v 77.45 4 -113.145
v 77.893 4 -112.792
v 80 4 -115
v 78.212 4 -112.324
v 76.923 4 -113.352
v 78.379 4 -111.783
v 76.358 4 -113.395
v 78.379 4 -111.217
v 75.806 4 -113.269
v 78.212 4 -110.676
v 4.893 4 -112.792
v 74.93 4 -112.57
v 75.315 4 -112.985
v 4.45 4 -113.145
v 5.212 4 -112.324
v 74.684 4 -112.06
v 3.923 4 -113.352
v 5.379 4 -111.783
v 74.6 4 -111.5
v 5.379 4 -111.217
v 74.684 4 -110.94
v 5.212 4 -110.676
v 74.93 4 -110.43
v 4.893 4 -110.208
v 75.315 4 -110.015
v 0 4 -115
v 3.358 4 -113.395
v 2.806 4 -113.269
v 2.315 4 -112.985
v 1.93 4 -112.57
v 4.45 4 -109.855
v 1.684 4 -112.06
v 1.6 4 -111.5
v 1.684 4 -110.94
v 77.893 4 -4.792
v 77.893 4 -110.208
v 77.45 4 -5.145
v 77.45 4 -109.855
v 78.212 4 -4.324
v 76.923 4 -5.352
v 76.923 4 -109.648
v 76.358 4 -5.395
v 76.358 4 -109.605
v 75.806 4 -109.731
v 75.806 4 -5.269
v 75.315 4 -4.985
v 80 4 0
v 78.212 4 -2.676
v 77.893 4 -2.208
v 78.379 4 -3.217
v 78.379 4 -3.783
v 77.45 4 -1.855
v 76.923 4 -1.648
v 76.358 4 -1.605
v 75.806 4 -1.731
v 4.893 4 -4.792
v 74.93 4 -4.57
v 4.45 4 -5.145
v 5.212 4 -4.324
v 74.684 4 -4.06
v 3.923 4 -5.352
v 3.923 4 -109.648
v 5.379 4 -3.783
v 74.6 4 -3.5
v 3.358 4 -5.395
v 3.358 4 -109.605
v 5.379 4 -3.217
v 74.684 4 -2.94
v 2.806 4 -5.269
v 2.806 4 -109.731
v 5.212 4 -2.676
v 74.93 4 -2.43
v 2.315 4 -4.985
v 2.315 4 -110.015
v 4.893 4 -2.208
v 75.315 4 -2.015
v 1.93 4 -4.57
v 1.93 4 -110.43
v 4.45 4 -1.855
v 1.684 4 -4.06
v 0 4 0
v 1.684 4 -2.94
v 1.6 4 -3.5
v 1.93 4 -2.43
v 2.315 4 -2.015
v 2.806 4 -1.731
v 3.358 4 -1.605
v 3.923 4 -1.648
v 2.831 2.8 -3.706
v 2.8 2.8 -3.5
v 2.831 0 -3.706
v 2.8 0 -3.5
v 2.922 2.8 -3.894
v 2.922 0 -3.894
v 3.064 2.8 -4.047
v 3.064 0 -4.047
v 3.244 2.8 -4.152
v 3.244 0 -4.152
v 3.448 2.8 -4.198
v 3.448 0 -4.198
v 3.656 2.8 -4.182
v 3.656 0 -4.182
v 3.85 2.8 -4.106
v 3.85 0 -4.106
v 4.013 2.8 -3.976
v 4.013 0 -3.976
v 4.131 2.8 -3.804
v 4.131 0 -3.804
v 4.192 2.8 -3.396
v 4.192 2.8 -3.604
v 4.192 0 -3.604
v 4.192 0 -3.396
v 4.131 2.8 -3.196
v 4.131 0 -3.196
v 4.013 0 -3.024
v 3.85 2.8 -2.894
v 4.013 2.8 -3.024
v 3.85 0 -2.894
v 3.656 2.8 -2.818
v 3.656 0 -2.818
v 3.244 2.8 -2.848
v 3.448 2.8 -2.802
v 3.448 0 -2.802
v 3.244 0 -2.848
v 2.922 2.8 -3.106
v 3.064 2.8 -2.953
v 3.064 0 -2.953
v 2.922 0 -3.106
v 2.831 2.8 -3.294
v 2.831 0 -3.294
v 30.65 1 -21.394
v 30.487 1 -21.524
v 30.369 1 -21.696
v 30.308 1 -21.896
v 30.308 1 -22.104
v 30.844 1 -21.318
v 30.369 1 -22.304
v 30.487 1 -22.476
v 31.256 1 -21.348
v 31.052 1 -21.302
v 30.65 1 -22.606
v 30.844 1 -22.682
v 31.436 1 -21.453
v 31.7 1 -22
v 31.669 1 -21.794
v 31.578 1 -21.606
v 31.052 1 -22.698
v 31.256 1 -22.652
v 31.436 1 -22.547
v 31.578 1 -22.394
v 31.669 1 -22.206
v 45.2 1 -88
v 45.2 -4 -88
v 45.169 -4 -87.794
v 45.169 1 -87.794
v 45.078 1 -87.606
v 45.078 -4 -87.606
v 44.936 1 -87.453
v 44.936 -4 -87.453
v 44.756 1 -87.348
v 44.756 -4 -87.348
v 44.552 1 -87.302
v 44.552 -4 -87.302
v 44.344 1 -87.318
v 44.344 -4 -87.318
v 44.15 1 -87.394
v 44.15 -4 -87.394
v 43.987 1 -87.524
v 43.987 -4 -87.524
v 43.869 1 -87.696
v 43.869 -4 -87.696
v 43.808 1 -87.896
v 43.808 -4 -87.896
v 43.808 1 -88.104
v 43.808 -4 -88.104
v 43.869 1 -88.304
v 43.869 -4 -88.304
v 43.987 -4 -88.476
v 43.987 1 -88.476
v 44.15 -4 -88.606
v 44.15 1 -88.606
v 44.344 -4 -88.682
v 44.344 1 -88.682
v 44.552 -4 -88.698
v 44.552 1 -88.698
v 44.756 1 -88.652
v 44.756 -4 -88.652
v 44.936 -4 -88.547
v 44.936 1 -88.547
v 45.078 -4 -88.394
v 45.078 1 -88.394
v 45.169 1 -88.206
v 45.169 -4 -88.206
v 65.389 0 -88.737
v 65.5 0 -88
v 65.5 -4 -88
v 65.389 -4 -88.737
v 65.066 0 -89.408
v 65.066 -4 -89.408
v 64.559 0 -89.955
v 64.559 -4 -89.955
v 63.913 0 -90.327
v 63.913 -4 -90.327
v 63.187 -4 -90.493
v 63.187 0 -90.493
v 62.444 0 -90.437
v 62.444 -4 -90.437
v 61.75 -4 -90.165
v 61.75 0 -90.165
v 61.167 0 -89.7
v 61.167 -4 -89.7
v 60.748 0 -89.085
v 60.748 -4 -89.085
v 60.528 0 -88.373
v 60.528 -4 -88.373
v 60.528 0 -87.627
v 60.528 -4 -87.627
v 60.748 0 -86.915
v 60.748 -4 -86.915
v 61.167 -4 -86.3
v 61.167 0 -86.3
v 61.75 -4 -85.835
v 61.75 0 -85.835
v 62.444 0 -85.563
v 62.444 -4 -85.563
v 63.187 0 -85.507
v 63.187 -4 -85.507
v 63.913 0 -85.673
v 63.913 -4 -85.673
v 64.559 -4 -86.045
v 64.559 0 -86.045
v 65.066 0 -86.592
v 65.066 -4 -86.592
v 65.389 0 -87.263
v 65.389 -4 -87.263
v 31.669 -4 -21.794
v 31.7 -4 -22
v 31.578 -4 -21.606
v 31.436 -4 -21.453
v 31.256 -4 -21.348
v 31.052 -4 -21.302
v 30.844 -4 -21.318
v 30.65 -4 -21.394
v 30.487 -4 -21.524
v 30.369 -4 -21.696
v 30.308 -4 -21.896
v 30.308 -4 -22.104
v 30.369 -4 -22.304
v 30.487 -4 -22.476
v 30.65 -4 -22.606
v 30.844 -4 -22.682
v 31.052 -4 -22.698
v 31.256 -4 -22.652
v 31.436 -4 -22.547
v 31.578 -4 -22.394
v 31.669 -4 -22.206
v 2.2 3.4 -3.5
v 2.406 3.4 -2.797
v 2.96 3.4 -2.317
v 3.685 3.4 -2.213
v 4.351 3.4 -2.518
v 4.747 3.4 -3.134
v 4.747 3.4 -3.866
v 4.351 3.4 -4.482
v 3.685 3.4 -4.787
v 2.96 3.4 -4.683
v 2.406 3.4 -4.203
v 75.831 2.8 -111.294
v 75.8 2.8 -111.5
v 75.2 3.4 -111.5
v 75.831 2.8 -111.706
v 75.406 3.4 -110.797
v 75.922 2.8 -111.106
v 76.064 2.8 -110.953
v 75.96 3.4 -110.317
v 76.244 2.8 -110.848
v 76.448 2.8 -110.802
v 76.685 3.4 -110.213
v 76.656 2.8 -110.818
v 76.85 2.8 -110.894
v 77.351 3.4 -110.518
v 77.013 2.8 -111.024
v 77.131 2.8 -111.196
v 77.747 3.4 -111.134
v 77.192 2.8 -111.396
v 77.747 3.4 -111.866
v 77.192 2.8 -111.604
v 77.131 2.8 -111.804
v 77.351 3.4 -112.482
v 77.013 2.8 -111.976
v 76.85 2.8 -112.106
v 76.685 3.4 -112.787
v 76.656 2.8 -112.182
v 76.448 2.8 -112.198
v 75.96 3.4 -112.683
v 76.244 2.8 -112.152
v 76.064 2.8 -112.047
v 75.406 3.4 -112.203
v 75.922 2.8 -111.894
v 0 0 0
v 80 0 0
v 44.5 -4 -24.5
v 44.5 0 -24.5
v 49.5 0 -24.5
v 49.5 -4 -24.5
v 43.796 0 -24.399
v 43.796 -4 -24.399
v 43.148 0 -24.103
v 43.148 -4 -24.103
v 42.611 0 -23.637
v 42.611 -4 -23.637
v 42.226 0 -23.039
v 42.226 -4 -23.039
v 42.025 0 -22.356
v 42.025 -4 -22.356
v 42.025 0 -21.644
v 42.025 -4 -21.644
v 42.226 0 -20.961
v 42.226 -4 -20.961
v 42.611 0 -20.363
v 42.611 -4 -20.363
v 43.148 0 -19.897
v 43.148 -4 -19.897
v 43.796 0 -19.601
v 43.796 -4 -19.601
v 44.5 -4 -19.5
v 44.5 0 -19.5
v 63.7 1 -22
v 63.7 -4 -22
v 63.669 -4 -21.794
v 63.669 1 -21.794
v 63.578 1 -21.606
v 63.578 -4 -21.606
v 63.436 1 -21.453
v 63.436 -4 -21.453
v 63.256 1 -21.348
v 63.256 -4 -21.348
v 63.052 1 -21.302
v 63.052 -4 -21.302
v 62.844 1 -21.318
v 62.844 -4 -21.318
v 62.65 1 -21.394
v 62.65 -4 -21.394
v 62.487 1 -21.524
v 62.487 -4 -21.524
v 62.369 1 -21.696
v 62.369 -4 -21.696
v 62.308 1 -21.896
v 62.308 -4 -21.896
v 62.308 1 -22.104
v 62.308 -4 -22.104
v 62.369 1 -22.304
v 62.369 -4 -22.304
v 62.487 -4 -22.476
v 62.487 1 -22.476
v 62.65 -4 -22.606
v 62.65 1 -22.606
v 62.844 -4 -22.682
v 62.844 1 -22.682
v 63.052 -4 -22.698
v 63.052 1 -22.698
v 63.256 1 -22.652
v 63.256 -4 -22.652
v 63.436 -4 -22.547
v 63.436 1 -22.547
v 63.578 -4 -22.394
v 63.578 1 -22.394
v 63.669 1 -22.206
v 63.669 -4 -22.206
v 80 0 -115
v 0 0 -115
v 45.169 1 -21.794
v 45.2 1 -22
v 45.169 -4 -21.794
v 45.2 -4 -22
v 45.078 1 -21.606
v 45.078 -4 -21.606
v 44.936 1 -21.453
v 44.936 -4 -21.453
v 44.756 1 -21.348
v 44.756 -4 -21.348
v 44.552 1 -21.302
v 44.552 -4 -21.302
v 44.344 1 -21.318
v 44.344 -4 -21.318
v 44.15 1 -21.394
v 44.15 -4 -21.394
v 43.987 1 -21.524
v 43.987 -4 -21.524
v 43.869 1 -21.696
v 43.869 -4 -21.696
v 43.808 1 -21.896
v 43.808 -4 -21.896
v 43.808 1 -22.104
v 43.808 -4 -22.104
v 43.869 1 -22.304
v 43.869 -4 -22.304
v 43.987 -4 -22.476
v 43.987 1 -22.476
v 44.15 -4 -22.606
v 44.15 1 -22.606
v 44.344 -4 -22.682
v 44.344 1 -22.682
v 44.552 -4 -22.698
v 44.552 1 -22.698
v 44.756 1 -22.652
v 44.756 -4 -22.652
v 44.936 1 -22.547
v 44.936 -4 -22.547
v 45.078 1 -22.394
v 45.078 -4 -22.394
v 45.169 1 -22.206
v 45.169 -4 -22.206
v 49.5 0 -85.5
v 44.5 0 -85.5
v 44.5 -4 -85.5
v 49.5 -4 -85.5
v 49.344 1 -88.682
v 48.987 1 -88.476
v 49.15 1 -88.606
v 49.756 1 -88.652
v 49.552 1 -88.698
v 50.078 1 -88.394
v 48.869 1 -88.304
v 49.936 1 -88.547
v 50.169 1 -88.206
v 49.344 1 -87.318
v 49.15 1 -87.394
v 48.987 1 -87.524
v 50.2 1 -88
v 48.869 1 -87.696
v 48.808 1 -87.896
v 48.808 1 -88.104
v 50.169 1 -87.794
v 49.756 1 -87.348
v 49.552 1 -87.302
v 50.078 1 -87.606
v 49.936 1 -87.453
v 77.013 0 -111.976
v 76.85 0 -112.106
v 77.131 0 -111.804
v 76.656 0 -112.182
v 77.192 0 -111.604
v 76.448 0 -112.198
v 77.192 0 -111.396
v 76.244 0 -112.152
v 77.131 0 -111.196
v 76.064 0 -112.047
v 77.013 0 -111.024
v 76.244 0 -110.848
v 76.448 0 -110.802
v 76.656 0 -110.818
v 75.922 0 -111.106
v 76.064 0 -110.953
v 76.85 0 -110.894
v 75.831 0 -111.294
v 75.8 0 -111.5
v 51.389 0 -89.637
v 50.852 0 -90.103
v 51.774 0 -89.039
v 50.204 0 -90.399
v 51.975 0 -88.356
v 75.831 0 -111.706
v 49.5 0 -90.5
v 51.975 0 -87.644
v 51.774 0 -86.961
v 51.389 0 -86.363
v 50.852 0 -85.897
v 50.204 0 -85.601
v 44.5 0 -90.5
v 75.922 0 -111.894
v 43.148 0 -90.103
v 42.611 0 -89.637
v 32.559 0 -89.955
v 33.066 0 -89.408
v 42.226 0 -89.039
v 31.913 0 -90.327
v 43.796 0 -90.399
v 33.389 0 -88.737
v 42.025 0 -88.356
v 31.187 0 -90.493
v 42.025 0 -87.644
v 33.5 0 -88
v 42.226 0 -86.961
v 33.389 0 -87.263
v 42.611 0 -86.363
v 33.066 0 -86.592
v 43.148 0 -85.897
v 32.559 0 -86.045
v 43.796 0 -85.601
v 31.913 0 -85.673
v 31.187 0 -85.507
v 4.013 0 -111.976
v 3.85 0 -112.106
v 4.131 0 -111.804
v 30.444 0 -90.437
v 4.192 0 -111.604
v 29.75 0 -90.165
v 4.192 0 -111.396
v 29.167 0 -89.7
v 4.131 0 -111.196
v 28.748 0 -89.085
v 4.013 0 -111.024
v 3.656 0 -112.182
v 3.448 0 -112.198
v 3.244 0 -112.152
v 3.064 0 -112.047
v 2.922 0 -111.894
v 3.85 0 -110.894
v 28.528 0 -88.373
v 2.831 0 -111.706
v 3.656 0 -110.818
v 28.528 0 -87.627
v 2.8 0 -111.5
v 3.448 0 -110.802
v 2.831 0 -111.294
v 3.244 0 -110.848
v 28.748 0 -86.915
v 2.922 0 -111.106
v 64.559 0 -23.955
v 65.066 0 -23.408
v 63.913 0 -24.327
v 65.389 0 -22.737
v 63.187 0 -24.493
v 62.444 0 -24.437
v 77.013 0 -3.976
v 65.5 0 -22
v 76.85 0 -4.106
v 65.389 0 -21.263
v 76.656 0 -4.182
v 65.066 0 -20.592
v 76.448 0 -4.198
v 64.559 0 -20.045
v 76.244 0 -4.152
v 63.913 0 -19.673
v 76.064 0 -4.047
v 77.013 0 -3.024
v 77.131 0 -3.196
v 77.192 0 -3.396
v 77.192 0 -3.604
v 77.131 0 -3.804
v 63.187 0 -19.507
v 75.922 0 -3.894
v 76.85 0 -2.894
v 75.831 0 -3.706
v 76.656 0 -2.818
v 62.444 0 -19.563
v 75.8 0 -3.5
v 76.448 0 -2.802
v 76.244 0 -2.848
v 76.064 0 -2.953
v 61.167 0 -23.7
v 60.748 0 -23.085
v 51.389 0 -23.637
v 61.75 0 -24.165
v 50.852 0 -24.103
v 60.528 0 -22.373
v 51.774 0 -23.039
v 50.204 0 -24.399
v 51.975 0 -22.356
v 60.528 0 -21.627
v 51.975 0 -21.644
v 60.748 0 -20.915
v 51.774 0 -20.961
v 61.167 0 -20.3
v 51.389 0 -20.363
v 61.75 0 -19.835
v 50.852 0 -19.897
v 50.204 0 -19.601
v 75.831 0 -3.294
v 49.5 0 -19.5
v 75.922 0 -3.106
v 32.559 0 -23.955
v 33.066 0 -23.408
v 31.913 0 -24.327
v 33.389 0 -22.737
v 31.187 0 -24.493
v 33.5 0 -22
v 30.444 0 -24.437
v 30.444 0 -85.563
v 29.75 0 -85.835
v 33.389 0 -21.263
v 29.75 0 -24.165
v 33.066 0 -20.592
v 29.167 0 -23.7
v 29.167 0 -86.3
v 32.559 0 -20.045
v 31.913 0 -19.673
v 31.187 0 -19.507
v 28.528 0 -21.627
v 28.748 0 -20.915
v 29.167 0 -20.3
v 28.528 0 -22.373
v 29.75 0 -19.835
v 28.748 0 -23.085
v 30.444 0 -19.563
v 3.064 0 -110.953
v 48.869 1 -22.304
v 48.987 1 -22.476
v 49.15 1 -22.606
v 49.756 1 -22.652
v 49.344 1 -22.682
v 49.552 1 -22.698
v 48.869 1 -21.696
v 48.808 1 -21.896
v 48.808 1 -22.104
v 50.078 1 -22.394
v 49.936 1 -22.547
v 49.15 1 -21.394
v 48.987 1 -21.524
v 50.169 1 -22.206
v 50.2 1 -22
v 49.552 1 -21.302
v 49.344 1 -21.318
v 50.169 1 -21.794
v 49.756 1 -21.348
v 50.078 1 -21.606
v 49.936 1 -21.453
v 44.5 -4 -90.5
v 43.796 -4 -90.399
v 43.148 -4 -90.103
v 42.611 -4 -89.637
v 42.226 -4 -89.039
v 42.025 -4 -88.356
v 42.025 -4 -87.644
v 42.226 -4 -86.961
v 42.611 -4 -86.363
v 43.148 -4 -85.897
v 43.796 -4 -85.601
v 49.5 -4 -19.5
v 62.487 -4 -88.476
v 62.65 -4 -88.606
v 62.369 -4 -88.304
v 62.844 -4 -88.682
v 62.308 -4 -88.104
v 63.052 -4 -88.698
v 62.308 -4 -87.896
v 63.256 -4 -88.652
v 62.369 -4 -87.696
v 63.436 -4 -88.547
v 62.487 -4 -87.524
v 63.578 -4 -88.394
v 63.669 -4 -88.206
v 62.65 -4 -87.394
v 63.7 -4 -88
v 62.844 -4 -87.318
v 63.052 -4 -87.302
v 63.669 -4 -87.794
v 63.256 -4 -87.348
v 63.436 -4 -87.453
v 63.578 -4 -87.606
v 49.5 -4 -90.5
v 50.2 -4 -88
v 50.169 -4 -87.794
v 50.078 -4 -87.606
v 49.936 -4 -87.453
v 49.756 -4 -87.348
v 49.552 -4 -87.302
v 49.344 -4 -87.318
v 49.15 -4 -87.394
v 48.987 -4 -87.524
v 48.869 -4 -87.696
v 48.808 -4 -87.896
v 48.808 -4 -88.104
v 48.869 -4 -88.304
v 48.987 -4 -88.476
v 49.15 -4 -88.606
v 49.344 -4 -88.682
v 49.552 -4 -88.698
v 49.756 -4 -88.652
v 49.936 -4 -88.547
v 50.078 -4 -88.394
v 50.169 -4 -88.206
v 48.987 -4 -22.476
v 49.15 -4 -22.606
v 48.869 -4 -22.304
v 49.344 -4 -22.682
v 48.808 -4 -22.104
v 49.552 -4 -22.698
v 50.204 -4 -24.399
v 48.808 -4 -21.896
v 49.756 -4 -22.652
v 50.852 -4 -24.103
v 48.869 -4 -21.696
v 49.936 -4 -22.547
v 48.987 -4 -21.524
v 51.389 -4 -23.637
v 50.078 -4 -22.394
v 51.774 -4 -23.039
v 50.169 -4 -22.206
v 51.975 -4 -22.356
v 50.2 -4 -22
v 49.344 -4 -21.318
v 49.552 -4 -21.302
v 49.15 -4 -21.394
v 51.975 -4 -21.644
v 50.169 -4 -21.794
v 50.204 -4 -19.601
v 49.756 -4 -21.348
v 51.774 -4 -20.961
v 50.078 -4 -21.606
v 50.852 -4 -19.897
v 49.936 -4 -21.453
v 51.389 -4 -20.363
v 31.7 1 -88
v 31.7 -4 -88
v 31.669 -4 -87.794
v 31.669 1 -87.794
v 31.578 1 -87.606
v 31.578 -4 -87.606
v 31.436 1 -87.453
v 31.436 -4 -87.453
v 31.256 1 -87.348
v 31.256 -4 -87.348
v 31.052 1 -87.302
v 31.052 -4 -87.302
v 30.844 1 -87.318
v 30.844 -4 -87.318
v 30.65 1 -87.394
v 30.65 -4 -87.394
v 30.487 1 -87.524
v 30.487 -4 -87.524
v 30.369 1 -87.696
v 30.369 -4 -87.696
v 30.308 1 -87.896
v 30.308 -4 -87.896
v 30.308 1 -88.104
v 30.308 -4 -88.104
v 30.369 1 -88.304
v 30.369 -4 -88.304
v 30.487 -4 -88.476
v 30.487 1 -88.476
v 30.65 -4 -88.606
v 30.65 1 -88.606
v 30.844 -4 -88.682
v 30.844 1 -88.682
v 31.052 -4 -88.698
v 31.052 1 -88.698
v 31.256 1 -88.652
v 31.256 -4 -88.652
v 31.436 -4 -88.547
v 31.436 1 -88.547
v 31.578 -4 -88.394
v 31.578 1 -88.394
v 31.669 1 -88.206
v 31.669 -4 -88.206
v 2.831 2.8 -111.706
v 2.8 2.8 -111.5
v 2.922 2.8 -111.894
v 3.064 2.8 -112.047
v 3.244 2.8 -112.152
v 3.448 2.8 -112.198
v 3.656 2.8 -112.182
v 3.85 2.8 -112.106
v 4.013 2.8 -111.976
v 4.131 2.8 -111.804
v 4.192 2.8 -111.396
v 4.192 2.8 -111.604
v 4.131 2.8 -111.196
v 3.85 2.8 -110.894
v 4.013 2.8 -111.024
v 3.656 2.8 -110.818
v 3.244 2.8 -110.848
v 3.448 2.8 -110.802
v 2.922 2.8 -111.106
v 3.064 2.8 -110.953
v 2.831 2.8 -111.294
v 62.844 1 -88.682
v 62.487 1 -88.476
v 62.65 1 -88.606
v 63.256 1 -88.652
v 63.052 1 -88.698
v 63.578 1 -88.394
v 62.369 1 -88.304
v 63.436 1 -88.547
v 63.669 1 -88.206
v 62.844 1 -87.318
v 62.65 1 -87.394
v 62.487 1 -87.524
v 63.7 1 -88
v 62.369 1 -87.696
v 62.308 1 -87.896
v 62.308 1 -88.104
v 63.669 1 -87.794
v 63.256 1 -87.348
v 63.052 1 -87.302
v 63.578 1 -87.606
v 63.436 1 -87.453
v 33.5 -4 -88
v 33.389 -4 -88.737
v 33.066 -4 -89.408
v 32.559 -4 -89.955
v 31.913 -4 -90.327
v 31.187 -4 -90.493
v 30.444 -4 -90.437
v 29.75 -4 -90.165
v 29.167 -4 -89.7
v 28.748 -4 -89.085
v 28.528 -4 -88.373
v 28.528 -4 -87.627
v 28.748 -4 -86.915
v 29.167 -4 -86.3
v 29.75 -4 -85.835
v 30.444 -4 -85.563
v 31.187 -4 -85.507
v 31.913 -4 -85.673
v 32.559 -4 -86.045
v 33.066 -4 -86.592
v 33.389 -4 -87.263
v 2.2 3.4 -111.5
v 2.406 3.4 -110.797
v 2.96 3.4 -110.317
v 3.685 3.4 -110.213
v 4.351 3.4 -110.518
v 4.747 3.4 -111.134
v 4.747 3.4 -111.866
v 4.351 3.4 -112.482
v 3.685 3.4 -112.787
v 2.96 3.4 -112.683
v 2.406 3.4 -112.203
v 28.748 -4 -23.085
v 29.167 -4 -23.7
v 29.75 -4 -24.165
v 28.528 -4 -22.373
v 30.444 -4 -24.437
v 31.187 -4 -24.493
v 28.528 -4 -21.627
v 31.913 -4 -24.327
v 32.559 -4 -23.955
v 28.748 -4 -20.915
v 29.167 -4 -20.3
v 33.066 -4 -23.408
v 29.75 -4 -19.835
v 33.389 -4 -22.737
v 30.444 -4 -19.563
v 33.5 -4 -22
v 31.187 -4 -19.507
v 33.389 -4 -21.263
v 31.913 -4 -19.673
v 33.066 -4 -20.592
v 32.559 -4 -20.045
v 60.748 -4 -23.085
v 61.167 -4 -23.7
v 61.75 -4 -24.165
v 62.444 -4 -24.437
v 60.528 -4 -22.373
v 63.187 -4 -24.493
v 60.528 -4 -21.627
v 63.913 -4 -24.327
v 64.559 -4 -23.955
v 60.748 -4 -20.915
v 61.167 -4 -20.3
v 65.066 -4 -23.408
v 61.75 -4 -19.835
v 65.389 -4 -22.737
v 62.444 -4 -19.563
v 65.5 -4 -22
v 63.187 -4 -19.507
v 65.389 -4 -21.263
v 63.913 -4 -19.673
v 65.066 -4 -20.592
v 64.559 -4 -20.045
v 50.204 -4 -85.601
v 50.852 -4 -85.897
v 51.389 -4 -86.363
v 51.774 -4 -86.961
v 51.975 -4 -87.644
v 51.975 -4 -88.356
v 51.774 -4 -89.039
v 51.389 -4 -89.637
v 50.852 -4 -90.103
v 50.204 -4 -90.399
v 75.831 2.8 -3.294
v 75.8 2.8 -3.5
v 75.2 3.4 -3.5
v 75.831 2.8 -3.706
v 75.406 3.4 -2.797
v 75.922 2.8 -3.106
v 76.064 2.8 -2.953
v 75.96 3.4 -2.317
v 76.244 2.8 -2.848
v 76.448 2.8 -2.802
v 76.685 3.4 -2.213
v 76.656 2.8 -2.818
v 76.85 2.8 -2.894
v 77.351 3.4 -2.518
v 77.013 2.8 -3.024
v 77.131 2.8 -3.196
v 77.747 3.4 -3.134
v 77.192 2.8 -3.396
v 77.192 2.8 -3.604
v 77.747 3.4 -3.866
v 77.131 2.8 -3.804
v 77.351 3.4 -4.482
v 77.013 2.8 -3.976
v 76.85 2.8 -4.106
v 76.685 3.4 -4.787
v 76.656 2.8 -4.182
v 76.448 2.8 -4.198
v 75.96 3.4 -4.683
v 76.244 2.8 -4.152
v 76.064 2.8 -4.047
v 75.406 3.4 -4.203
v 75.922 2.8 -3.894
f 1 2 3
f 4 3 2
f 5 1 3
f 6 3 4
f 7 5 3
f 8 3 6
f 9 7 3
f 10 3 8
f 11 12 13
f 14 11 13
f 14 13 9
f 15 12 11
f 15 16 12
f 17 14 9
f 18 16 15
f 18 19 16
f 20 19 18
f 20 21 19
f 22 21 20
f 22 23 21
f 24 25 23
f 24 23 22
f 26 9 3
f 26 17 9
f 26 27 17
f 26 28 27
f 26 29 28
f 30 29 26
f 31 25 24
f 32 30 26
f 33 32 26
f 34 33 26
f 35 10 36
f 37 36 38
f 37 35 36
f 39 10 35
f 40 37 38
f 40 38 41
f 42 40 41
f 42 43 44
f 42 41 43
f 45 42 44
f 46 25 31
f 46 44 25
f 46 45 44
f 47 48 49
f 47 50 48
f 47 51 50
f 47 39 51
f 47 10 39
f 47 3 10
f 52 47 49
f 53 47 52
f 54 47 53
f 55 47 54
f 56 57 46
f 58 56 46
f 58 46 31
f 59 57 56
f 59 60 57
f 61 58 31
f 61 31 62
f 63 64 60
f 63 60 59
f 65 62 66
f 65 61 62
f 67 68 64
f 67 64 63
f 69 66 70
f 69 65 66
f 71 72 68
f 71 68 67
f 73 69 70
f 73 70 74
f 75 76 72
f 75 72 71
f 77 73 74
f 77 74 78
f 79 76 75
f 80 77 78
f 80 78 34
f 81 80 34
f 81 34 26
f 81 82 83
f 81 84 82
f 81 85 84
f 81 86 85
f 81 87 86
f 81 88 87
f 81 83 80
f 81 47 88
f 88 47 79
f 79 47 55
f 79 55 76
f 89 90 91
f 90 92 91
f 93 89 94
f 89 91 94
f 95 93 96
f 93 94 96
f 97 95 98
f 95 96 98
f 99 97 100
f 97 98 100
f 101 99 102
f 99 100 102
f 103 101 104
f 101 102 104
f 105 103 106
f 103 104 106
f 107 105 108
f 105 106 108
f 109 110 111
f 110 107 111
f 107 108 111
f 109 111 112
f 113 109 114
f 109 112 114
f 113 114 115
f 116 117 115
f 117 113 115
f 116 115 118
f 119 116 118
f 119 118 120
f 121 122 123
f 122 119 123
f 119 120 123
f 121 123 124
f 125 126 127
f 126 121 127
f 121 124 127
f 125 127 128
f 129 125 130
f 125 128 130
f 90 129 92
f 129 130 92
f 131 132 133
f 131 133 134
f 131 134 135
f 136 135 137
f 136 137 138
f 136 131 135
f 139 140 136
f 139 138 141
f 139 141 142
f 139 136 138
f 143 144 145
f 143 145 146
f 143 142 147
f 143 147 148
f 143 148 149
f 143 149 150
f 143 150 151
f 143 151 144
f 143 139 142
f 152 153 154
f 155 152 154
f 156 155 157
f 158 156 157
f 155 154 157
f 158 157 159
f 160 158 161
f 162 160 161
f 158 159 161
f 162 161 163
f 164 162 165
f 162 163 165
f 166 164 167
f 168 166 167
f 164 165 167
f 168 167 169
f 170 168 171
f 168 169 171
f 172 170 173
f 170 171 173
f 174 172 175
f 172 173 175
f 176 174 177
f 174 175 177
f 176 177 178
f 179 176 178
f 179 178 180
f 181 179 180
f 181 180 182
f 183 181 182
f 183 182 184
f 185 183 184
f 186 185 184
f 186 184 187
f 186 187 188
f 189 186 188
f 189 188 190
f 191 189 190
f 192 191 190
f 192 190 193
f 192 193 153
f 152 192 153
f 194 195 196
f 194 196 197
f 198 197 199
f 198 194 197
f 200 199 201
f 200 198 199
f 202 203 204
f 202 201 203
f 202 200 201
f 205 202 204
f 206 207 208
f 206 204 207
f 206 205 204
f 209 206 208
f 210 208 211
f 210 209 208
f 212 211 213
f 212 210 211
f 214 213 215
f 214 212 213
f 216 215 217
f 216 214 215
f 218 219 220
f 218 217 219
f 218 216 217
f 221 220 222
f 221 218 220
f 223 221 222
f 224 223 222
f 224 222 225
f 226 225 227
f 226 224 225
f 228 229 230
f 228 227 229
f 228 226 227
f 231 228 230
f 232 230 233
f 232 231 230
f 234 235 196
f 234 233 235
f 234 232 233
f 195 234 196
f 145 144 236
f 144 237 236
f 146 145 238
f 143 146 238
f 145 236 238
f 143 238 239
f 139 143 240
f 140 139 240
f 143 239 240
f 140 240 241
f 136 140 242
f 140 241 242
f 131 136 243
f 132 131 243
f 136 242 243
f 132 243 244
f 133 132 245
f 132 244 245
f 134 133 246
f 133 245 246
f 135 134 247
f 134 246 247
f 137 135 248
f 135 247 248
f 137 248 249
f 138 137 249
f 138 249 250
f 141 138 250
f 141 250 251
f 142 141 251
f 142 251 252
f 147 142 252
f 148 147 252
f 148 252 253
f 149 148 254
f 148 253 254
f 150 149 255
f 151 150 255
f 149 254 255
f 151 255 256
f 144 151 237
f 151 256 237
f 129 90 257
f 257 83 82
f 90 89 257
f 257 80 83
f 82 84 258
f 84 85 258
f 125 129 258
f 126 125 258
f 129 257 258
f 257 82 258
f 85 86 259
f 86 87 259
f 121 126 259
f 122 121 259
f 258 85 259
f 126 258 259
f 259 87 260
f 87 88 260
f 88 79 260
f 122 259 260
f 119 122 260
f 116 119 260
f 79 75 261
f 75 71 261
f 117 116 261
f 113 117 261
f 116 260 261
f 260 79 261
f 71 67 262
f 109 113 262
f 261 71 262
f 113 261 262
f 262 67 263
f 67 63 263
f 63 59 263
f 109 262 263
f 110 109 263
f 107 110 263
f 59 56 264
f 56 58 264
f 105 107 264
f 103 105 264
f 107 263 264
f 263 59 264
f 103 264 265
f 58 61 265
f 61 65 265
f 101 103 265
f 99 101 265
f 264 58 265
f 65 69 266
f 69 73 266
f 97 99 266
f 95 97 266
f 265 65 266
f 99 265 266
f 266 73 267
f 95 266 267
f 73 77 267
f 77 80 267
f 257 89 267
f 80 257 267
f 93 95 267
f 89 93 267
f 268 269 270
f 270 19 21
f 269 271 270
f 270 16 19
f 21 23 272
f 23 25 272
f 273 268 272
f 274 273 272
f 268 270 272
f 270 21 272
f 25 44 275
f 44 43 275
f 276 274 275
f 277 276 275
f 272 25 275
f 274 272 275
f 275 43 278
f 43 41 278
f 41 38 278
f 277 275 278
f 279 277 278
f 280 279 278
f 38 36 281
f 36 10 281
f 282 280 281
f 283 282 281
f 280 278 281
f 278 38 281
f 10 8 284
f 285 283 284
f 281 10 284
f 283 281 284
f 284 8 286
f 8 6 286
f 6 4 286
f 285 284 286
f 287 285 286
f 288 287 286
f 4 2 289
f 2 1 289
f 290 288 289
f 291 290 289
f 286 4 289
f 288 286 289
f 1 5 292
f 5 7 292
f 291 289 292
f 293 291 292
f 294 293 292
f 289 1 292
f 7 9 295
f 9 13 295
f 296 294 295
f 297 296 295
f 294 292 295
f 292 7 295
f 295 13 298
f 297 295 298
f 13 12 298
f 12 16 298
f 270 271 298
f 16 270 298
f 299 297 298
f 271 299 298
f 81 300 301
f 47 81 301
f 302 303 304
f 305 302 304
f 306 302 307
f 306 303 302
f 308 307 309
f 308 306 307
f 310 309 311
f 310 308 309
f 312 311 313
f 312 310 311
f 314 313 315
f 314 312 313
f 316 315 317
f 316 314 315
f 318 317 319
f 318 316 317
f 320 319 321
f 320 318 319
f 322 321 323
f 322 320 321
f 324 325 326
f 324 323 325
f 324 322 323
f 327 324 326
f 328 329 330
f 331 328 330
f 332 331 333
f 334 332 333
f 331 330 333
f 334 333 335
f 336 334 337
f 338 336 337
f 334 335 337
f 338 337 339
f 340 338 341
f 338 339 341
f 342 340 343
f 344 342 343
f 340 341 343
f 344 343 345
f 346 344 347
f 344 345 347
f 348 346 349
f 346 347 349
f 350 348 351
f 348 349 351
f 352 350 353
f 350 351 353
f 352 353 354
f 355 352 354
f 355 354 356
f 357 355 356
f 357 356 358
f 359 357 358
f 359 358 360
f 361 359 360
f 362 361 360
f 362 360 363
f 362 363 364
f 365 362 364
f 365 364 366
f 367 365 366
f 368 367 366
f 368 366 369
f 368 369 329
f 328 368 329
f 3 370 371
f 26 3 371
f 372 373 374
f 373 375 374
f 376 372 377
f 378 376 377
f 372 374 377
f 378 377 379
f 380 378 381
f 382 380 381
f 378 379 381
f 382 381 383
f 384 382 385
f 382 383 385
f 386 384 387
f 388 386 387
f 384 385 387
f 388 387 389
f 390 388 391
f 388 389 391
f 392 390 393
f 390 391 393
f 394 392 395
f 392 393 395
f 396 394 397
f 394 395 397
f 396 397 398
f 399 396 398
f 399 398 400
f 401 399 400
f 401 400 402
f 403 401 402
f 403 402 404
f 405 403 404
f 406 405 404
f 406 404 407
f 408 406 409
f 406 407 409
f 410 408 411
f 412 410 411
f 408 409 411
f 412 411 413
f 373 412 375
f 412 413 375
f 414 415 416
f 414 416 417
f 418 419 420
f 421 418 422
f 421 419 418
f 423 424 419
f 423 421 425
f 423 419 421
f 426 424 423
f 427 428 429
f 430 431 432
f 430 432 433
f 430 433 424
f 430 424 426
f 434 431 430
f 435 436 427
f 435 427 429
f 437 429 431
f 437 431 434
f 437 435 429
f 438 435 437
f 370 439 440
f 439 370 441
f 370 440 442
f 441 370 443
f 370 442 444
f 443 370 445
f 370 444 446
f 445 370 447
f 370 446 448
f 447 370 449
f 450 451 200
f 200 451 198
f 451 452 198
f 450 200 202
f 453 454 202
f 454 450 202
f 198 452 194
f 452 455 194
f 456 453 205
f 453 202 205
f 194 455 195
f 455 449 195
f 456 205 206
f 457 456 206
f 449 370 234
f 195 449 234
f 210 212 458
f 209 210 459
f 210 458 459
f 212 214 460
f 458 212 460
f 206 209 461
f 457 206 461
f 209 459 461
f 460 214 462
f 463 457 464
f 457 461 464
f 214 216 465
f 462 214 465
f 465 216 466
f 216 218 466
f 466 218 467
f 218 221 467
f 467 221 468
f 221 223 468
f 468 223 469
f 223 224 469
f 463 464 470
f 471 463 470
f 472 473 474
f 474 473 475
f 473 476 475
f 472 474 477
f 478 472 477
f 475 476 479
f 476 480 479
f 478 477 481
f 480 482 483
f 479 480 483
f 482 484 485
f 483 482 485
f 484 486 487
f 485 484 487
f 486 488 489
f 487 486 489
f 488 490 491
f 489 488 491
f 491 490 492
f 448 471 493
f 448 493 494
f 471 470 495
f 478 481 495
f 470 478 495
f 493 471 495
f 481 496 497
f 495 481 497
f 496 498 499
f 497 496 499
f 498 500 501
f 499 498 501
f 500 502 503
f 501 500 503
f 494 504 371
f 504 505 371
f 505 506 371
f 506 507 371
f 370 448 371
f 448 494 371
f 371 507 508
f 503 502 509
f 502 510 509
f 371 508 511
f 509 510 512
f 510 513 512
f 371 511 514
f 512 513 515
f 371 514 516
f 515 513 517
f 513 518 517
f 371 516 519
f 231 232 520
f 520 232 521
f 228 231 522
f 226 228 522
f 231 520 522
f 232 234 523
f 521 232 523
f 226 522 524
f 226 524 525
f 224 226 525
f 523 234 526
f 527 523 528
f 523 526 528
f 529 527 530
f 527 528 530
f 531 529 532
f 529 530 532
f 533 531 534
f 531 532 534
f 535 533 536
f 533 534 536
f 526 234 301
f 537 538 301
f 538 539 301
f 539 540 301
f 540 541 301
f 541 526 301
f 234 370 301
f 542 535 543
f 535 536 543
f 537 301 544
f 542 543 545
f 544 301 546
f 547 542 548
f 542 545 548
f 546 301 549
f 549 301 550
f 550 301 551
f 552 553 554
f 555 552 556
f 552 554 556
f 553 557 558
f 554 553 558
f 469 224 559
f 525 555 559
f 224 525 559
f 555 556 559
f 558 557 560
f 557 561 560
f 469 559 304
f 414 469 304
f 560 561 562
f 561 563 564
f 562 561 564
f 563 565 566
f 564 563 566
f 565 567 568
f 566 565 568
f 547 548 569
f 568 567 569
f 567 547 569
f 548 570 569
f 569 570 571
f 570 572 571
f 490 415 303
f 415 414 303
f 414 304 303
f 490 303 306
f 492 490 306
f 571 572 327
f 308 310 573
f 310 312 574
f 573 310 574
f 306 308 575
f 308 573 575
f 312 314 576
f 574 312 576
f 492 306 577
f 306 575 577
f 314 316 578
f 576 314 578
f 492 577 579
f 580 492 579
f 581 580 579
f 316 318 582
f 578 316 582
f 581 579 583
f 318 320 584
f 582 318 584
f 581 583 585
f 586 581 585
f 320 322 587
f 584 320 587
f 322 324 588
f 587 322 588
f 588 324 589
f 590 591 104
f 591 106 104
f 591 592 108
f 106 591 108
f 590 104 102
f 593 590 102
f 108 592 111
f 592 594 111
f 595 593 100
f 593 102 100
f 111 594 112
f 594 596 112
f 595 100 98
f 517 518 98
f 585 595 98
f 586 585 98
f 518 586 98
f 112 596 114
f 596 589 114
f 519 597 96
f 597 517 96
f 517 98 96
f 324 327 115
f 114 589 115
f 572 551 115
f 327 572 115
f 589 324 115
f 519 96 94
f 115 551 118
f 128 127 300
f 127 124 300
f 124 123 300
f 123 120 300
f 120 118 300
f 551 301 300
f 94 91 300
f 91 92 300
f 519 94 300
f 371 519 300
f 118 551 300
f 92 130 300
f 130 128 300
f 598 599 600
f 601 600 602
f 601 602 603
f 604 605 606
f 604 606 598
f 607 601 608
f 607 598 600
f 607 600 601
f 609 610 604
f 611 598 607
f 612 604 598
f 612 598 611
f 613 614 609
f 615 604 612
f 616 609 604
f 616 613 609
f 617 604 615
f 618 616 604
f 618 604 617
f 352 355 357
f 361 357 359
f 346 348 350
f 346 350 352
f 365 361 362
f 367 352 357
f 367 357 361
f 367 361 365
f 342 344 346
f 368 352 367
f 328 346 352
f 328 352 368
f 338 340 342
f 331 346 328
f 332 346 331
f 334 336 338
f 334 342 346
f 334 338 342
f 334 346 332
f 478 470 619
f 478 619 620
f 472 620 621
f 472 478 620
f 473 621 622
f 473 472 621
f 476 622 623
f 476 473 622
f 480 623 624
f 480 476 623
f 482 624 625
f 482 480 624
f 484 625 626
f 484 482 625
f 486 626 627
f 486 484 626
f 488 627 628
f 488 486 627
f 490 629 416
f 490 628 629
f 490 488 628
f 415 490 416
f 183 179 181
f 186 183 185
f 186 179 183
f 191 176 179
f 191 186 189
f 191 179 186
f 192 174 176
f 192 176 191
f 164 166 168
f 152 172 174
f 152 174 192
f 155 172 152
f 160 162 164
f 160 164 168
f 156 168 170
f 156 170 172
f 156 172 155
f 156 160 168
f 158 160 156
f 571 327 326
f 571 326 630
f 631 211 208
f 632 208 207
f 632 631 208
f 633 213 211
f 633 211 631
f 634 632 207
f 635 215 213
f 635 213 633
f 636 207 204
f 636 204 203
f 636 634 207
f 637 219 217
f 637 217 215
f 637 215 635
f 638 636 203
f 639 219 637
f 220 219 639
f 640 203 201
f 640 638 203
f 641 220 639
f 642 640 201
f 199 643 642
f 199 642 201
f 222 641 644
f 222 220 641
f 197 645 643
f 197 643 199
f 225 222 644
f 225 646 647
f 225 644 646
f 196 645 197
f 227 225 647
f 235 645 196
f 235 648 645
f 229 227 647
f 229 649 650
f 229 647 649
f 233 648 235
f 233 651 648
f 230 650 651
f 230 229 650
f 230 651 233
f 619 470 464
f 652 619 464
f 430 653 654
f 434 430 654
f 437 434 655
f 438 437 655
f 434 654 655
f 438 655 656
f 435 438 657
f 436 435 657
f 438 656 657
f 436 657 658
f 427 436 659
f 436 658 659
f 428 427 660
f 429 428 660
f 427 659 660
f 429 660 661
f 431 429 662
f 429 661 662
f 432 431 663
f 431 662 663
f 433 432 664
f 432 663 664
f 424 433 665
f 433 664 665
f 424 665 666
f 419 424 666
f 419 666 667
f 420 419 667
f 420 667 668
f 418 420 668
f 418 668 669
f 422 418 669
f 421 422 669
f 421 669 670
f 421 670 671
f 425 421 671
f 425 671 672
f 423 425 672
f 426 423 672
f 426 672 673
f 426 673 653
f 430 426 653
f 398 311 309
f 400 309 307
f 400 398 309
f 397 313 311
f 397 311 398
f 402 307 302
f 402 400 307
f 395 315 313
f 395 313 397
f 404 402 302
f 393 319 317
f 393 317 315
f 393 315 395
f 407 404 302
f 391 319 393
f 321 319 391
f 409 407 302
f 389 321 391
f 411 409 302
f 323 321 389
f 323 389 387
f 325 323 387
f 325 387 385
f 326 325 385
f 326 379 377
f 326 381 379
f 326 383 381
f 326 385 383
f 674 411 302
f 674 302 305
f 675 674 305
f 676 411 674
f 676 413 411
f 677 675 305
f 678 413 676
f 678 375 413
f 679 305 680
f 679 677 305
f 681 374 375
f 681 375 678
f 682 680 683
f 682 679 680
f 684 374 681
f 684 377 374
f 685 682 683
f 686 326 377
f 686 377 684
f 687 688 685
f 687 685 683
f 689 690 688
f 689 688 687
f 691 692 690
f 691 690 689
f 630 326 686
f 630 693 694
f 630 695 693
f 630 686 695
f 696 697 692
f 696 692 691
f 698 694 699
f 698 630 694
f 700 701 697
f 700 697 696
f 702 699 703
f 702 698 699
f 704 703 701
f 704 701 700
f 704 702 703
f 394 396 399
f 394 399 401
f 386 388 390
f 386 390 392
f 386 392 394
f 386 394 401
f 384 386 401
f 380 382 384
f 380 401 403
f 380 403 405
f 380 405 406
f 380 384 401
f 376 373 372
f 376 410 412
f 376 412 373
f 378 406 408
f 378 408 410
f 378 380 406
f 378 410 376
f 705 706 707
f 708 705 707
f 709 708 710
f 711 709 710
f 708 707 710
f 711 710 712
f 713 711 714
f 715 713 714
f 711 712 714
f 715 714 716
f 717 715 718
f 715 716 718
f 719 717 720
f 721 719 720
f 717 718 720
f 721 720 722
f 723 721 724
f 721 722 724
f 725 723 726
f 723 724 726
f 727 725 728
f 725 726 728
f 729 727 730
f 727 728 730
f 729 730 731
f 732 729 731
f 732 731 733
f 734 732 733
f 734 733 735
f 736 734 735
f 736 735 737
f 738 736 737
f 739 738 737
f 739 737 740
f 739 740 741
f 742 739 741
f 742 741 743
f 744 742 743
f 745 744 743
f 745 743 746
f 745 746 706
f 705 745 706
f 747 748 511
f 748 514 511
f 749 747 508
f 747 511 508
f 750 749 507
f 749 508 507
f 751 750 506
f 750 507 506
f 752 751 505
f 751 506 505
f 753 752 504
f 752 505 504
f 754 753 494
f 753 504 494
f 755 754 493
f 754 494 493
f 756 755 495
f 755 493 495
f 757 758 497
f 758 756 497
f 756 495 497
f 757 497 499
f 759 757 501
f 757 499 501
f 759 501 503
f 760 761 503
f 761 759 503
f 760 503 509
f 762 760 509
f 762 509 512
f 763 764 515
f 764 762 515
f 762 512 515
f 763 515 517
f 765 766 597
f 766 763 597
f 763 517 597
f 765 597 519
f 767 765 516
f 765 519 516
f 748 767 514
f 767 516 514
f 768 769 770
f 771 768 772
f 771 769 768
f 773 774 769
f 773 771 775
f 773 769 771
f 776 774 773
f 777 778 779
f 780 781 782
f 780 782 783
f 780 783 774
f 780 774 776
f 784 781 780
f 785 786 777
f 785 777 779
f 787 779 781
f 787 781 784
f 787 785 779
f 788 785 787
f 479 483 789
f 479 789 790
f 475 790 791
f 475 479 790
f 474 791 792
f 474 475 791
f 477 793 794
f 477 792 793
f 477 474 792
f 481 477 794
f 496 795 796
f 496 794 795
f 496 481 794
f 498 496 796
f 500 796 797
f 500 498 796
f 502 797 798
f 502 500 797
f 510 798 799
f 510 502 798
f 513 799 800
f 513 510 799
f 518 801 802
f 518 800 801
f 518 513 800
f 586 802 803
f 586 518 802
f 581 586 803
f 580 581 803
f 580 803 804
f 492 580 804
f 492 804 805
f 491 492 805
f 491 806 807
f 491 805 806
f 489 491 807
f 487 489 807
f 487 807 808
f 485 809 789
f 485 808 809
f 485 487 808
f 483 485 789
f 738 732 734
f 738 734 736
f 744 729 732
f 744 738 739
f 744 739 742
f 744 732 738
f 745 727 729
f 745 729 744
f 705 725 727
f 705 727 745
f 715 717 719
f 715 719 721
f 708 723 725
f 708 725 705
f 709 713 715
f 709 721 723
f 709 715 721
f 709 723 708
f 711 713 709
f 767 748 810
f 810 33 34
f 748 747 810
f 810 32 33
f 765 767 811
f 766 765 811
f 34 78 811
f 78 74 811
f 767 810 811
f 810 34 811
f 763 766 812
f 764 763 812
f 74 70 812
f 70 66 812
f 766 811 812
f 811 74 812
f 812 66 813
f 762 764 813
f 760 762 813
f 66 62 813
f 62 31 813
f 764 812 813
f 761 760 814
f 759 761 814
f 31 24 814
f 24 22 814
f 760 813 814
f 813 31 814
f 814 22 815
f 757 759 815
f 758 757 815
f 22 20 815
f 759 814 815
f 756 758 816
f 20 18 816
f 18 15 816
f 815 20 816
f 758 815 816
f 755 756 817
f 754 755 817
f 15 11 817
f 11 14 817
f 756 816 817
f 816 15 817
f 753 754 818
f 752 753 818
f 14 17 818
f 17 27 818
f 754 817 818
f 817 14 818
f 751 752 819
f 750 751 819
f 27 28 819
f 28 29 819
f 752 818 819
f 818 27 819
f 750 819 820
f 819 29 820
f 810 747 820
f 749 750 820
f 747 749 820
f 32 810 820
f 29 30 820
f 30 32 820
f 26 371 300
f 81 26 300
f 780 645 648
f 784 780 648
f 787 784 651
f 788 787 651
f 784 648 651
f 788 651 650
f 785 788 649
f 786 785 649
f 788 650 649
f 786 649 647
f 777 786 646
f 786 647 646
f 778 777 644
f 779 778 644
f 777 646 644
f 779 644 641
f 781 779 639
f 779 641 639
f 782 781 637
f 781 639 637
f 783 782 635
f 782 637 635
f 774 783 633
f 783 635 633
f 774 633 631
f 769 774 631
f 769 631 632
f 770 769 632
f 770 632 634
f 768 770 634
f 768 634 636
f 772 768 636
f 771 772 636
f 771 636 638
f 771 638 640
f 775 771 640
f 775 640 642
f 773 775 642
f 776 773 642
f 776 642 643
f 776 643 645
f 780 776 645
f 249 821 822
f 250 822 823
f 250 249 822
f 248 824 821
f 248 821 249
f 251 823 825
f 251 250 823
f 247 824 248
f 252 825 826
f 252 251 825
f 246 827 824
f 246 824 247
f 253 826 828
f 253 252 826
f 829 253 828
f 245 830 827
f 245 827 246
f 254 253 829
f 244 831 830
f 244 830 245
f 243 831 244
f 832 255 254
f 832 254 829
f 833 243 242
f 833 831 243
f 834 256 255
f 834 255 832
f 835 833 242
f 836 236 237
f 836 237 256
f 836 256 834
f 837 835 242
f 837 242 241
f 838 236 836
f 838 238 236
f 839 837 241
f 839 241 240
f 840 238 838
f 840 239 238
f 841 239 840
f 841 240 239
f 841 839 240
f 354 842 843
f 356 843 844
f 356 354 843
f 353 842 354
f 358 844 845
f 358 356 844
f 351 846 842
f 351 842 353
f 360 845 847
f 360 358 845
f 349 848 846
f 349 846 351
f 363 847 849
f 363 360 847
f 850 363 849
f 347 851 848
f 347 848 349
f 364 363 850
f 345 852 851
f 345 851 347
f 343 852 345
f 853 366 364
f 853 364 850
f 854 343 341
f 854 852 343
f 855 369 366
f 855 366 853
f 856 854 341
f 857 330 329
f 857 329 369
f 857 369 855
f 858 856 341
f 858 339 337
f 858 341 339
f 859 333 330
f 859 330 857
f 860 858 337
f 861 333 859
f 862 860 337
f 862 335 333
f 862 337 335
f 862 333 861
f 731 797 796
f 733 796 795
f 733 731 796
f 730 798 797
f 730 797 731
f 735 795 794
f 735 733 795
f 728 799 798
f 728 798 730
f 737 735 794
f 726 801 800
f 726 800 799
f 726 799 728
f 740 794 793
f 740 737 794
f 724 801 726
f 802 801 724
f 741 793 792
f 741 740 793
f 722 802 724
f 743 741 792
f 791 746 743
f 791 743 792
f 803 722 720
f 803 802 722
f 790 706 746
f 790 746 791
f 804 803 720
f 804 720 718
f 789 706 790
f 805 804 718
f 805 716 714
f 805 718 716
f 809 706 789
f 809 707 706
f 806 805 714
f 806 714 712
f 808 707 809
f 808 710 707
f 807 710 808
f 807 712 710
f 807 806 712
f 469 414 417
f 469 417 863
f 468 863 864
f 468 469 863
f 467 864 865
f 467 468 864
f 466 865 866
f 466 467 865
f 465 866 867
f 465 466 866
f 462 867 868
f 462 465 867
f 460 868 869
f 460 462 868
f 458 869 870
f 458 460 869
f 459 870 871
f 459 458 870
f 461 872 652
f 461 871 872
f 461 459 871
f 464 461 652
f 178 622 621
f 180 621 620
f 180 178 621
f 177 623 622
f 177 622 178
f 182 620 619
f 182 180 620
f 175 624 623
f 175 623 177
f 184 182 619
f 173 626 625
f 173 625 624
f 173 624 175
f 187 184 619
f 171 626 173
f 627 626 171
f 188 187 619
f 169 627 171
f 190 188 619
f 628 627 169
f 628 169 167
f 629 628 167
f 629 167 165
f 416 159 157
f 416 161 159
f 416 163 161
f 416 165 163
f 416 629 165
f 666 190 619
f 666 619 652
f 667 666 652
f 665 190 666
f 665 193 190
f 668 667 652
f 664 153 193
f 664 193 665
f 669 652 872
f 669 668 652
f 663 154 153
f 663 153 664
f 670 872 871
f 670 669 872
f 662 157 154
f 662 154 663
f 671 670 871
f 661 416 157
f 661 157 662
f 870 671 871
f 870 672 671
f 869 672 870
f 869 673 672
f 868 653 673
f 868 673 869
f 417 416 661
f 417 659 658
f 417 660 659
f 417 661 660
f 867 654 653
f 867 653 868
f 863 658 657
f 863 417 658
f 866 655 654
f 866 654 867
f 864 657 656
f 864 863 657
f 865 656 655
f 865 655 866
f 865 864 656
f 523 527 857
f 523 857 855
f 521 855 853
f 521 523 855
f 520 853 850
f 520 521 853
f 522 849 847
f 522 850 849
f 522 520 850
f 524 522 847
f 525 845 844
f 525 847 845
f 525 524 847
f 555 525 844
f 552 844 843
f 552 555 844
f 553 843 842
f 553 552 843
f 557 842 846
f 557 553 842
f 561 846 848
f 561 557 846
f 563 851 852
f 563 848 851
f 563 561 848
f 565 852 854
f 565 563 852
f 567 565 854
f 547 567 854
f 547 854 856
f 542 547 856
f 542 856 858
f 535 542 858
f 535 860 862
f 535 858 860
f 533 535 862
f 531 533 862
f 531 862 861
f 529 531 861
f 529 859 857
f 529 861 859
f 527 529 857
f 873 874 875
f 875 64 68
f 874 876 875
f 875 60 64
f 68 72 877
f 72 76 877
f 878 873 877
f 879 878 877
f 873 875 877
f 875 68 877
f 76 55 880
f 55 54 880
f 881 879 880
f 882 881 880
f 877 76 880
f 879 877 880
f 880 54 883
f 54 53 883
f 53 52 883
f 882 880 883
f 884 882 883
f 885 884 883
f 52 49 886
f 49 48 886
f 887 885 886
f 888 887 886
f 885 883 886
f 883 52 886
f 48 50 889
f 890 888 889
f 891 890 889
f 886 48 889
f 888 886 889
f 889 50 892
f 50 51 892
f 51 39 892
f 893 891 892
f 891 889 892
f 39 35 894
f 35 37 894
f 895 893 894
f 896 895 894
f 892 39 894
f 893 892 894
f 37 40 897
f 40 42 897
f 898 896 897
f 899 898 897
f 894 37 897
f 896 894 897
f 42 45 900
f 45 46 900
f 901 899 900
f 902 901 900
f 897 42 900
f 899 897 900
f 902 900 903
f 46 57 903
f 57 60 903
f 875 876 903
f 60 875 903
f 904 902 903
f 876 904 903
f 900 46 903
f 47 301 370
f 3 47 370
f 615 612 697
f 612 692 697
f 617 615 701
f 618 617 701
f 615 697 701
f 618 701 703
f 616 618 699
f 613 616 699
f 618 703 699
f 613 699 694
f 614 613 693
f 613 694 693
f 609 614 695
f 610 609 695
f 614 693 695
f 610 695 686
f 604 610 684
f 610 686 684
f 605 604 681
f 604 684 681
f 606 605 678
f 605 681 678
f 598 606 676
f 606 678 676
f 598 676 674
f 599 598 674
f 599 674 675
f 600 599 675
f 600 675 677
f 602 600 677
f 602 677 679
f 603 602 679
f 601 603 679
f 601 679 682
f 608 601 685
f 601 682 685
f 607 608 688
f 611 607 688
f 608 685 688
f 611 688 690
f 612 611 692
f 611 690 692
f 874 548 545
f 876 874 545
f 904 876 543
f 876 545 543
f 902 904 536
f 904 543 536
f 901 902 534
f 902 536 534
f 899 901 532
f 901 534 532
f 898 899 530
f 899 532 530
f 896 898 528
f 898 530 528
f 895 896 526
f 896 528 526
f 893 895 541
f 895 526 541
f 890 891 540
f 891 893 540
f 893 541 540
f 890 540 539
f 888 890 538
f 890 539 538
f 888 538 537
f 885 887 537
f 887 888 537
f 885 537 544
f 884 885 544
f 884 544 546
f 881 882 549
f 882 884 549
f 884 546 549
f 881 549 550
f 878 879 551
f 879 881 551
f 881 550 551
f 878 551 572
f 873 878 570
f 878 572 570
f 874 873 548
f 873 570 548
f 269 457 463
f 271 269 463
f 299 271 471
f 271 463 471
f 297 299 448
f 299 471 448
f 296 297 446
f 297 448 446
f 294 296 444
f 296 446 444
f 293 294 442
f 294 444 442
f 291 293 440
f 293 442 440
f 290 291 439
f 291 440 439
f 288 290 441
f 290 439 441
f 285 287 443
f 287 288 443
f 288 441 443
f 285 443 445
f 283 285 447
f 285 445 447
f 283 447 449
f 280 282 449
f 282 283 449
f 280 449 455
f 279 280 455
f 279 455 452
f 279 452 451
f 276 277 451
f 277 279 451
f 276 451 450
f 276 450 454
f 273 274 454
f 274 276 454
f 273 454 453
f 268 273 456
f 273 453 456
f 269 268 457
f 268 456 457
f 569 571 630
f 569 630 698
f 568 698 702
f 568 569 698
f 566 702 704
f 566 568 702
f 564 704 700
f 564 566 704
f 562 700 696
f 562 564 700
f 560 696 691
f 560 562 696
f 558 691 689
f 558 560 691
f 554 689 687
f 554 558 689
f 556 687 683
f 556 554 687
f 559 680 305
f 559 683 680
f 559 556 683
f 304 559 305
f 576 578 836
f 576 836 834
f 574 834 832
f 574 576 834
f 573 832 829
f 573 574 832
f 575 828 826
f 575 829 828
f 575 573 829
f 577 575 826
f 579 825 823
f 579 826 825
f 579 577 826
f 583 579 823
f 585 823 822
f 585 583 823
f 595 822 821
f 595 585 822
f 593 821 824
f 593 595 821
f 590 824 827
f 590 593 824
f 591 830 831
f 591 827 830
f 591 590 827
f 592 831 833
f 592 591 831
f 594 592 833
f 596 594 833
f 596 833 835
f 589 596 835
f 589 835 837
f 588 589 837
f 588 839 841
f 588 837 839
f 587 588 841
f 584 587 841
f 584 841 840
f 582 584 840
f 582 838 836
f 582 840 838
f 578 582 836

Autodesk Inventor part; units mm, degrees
ref_plane "YZ Plane" through (0, 0, 0) normal (1, 0, 0) x (0, 1, 0)
ref_plane "XZ Plane" through (0, 0, 0) normal (0, 1, 0) x (-1, 0, 0)
ref_plane "XY Plane" through (0, 0, 0) normal (0, 0, 1) x (1, 0, 0)
sketch "Skizze1" plane through (0, 0, 0) normal (0, 1, 0) x (-1, 0, 0)
  line L0 (0, 0) -> (-80, 0)
  line L1 (-80, 0) -> (-80, -115)
  line L2 (-80, -115) -> (0, -115)
  line L3 (0, -115) -> (0, 0)
  line L4 (-3.5, -3.5) -> (-76.5, -3.5) construction
  line L5 (-76.5, -3.5) -> (-76.5, -111.5) construction
  line L6 (-76.5, -111.5) -> (-3.5, -111.5) construction
  line L7 (-3.5, -111.5) -> (-3.5, -3.5) construction
  circle A0 centre (-3.5, -3.5) radius 0.7
  circle A1 centre (-3.5, -111.5) radius 0.7
  circle A2 centre (-76.5, -111.5) radius 0.7
  circle A3 centre (-76.5, -3.5) radius 0.7
  dimension "d0" = 115
  dimension "d1" = 80
  dimension "d2" = 3.5
  dimension "d3" = 1.4
extrude "Extrusion1" add sketch "Skizze1" along normal blind 4
chamfer "Fasen1" distance 1.2 angle 45 4 edges at (4.2, 4, -3.5) (4.2, 4, -111.5) (77.2, 4, -111.5) (77.2, 4, -3.5)
sketch "Skizze2" plane through (0, 0, 0) normal (0, -1, 0) x (1, 0, 0)
  line L0 (29, -90) -> (46.5, -90) construction
  line L1 (46.5, -90) -> (46.5, -20) construction
  line L2 (46.5, -20) -> (29, -20) construction
  line L3 (29, -20) -> (29, -90) construction
  line L4 (0, -115) -> (0, 0) construction
  line L5 (47.5, -90) -> (65, -90) construction
  line L6 (65, -90) -> (65, -20) construction
  line L7 (65, -20) -> (47.5, -20) construction
  line L8 (47.5, -20) -> (47.5, -90) construction
  line L9 (80, -115) -> (0, -115) construction
  circle A0 centre (31, -88) radius 2.5
  arc A1 (44.5, -85.5) -> (44.5, -90.5) centre (44.5, -88) ccw
  circle A2 centre (63, -88) radius 2.5
  circle A3 centre (31, -22) radius 2.5
  arc A4 (44.5, -19.5) -> (44.5, -24.5) centre (44.5, -22) ccw
  arc A5 (49.5, -24.5) -> (49.5, -19.5) centre (49.5, -22) ccw
  circle A6 centre (63, -22) radius 2.5
  line L10 (31, -88) -> (44.5, -88) construction
  line L11 (44.5, -88) -> (44.5, -22) construction
  line L12 (44.5, -22) -> (31, -22) construction
  line L13 (31, -22) -> (31, -88) construction
  line L14 (49.5, -88) -> (63, -88) construction
  line L15 (63, -88) -> (63, -22) construction
  line L16 (63, -22) -> (49.5, -22) construction
  line L17 (49.5, -22) -> (49.5, -88) construction
  line L18 (44.5, -90.5) -> (49.5, -90.5)
  line L19 (44.5, -85.5) -> (49.5, -85.5)
  line L20 (44.5, -24.5) -> (49.5, -24.5)
  line L21 (44.5, -19.5) -> (49.5, -19.5)
  arc A7 (49.5, -90.5) -> (49.5, -85.5) centre (49.5, -88) ccw
  dimension "d9" = 29
  dimension "d10" = 17.5
  dimension "d11" = 70
  dimension "d12" = 25
  dimension "d13" = 1
  dimension "d14" = 2
  dimension "d15" = 2
  dimension "d16" = 5
extrude "Extrusion2" add sketch "Skizze2" along normal blind 4
sketch "Skizze3" plane through (31, -4, -22) normal (0, -1, 0) x (1, 0, 0)
  circle A0 centre (0, 0) radius 0.7
  arc A1 (13.5, 2.5) -> (13.5, -2.5) centre (13.5, 0) ccw projected
  circle A2 centre (13.5, 0) radius 0.7
  circle A3 centre (32, 0) radius 2.5 projected
  circle A4 centre (32, 0) radius 0.7
  arc A5 (18.5, -2.5) -> (18.5, 2.5) centre (18.5, 0) ccw projected
  circle A6 centre (18.5, 0) radius 0.7
  circle A7 centre (0, -66) radius 0.7
  arc A8 (13.5, -63.5) -> (13.5, -68.5) centre (13.5, -66) ccw projected
  circle A9 centre (13.5, -66) radius 0.7
  arc A10 (18.5, -68.5) -> (18.5, -63.5) centre (18.5, -66) ccw projected
  circle A11 centre (18.5, -66) radius 0.7
  circle A12 centre (32, -66) radius 0.7
  circle A13 centre (0, 0) radius 2.5 projected
  circle A14 centre (0, -66) radius 2.5 projected
  circle A15 centre (32, -66) radius 2.5 projected
  point P0 (-31, 22)
  dimension "d19" = 1.4
extrude "Extrusion3" cut sketch "Skizze3" against normal blind 5 contours A0 | A2 | A4 | A6 | A7 | A9 | A11 | A12
properties part number "Honigschleuder_Steuerung_Deckel"
